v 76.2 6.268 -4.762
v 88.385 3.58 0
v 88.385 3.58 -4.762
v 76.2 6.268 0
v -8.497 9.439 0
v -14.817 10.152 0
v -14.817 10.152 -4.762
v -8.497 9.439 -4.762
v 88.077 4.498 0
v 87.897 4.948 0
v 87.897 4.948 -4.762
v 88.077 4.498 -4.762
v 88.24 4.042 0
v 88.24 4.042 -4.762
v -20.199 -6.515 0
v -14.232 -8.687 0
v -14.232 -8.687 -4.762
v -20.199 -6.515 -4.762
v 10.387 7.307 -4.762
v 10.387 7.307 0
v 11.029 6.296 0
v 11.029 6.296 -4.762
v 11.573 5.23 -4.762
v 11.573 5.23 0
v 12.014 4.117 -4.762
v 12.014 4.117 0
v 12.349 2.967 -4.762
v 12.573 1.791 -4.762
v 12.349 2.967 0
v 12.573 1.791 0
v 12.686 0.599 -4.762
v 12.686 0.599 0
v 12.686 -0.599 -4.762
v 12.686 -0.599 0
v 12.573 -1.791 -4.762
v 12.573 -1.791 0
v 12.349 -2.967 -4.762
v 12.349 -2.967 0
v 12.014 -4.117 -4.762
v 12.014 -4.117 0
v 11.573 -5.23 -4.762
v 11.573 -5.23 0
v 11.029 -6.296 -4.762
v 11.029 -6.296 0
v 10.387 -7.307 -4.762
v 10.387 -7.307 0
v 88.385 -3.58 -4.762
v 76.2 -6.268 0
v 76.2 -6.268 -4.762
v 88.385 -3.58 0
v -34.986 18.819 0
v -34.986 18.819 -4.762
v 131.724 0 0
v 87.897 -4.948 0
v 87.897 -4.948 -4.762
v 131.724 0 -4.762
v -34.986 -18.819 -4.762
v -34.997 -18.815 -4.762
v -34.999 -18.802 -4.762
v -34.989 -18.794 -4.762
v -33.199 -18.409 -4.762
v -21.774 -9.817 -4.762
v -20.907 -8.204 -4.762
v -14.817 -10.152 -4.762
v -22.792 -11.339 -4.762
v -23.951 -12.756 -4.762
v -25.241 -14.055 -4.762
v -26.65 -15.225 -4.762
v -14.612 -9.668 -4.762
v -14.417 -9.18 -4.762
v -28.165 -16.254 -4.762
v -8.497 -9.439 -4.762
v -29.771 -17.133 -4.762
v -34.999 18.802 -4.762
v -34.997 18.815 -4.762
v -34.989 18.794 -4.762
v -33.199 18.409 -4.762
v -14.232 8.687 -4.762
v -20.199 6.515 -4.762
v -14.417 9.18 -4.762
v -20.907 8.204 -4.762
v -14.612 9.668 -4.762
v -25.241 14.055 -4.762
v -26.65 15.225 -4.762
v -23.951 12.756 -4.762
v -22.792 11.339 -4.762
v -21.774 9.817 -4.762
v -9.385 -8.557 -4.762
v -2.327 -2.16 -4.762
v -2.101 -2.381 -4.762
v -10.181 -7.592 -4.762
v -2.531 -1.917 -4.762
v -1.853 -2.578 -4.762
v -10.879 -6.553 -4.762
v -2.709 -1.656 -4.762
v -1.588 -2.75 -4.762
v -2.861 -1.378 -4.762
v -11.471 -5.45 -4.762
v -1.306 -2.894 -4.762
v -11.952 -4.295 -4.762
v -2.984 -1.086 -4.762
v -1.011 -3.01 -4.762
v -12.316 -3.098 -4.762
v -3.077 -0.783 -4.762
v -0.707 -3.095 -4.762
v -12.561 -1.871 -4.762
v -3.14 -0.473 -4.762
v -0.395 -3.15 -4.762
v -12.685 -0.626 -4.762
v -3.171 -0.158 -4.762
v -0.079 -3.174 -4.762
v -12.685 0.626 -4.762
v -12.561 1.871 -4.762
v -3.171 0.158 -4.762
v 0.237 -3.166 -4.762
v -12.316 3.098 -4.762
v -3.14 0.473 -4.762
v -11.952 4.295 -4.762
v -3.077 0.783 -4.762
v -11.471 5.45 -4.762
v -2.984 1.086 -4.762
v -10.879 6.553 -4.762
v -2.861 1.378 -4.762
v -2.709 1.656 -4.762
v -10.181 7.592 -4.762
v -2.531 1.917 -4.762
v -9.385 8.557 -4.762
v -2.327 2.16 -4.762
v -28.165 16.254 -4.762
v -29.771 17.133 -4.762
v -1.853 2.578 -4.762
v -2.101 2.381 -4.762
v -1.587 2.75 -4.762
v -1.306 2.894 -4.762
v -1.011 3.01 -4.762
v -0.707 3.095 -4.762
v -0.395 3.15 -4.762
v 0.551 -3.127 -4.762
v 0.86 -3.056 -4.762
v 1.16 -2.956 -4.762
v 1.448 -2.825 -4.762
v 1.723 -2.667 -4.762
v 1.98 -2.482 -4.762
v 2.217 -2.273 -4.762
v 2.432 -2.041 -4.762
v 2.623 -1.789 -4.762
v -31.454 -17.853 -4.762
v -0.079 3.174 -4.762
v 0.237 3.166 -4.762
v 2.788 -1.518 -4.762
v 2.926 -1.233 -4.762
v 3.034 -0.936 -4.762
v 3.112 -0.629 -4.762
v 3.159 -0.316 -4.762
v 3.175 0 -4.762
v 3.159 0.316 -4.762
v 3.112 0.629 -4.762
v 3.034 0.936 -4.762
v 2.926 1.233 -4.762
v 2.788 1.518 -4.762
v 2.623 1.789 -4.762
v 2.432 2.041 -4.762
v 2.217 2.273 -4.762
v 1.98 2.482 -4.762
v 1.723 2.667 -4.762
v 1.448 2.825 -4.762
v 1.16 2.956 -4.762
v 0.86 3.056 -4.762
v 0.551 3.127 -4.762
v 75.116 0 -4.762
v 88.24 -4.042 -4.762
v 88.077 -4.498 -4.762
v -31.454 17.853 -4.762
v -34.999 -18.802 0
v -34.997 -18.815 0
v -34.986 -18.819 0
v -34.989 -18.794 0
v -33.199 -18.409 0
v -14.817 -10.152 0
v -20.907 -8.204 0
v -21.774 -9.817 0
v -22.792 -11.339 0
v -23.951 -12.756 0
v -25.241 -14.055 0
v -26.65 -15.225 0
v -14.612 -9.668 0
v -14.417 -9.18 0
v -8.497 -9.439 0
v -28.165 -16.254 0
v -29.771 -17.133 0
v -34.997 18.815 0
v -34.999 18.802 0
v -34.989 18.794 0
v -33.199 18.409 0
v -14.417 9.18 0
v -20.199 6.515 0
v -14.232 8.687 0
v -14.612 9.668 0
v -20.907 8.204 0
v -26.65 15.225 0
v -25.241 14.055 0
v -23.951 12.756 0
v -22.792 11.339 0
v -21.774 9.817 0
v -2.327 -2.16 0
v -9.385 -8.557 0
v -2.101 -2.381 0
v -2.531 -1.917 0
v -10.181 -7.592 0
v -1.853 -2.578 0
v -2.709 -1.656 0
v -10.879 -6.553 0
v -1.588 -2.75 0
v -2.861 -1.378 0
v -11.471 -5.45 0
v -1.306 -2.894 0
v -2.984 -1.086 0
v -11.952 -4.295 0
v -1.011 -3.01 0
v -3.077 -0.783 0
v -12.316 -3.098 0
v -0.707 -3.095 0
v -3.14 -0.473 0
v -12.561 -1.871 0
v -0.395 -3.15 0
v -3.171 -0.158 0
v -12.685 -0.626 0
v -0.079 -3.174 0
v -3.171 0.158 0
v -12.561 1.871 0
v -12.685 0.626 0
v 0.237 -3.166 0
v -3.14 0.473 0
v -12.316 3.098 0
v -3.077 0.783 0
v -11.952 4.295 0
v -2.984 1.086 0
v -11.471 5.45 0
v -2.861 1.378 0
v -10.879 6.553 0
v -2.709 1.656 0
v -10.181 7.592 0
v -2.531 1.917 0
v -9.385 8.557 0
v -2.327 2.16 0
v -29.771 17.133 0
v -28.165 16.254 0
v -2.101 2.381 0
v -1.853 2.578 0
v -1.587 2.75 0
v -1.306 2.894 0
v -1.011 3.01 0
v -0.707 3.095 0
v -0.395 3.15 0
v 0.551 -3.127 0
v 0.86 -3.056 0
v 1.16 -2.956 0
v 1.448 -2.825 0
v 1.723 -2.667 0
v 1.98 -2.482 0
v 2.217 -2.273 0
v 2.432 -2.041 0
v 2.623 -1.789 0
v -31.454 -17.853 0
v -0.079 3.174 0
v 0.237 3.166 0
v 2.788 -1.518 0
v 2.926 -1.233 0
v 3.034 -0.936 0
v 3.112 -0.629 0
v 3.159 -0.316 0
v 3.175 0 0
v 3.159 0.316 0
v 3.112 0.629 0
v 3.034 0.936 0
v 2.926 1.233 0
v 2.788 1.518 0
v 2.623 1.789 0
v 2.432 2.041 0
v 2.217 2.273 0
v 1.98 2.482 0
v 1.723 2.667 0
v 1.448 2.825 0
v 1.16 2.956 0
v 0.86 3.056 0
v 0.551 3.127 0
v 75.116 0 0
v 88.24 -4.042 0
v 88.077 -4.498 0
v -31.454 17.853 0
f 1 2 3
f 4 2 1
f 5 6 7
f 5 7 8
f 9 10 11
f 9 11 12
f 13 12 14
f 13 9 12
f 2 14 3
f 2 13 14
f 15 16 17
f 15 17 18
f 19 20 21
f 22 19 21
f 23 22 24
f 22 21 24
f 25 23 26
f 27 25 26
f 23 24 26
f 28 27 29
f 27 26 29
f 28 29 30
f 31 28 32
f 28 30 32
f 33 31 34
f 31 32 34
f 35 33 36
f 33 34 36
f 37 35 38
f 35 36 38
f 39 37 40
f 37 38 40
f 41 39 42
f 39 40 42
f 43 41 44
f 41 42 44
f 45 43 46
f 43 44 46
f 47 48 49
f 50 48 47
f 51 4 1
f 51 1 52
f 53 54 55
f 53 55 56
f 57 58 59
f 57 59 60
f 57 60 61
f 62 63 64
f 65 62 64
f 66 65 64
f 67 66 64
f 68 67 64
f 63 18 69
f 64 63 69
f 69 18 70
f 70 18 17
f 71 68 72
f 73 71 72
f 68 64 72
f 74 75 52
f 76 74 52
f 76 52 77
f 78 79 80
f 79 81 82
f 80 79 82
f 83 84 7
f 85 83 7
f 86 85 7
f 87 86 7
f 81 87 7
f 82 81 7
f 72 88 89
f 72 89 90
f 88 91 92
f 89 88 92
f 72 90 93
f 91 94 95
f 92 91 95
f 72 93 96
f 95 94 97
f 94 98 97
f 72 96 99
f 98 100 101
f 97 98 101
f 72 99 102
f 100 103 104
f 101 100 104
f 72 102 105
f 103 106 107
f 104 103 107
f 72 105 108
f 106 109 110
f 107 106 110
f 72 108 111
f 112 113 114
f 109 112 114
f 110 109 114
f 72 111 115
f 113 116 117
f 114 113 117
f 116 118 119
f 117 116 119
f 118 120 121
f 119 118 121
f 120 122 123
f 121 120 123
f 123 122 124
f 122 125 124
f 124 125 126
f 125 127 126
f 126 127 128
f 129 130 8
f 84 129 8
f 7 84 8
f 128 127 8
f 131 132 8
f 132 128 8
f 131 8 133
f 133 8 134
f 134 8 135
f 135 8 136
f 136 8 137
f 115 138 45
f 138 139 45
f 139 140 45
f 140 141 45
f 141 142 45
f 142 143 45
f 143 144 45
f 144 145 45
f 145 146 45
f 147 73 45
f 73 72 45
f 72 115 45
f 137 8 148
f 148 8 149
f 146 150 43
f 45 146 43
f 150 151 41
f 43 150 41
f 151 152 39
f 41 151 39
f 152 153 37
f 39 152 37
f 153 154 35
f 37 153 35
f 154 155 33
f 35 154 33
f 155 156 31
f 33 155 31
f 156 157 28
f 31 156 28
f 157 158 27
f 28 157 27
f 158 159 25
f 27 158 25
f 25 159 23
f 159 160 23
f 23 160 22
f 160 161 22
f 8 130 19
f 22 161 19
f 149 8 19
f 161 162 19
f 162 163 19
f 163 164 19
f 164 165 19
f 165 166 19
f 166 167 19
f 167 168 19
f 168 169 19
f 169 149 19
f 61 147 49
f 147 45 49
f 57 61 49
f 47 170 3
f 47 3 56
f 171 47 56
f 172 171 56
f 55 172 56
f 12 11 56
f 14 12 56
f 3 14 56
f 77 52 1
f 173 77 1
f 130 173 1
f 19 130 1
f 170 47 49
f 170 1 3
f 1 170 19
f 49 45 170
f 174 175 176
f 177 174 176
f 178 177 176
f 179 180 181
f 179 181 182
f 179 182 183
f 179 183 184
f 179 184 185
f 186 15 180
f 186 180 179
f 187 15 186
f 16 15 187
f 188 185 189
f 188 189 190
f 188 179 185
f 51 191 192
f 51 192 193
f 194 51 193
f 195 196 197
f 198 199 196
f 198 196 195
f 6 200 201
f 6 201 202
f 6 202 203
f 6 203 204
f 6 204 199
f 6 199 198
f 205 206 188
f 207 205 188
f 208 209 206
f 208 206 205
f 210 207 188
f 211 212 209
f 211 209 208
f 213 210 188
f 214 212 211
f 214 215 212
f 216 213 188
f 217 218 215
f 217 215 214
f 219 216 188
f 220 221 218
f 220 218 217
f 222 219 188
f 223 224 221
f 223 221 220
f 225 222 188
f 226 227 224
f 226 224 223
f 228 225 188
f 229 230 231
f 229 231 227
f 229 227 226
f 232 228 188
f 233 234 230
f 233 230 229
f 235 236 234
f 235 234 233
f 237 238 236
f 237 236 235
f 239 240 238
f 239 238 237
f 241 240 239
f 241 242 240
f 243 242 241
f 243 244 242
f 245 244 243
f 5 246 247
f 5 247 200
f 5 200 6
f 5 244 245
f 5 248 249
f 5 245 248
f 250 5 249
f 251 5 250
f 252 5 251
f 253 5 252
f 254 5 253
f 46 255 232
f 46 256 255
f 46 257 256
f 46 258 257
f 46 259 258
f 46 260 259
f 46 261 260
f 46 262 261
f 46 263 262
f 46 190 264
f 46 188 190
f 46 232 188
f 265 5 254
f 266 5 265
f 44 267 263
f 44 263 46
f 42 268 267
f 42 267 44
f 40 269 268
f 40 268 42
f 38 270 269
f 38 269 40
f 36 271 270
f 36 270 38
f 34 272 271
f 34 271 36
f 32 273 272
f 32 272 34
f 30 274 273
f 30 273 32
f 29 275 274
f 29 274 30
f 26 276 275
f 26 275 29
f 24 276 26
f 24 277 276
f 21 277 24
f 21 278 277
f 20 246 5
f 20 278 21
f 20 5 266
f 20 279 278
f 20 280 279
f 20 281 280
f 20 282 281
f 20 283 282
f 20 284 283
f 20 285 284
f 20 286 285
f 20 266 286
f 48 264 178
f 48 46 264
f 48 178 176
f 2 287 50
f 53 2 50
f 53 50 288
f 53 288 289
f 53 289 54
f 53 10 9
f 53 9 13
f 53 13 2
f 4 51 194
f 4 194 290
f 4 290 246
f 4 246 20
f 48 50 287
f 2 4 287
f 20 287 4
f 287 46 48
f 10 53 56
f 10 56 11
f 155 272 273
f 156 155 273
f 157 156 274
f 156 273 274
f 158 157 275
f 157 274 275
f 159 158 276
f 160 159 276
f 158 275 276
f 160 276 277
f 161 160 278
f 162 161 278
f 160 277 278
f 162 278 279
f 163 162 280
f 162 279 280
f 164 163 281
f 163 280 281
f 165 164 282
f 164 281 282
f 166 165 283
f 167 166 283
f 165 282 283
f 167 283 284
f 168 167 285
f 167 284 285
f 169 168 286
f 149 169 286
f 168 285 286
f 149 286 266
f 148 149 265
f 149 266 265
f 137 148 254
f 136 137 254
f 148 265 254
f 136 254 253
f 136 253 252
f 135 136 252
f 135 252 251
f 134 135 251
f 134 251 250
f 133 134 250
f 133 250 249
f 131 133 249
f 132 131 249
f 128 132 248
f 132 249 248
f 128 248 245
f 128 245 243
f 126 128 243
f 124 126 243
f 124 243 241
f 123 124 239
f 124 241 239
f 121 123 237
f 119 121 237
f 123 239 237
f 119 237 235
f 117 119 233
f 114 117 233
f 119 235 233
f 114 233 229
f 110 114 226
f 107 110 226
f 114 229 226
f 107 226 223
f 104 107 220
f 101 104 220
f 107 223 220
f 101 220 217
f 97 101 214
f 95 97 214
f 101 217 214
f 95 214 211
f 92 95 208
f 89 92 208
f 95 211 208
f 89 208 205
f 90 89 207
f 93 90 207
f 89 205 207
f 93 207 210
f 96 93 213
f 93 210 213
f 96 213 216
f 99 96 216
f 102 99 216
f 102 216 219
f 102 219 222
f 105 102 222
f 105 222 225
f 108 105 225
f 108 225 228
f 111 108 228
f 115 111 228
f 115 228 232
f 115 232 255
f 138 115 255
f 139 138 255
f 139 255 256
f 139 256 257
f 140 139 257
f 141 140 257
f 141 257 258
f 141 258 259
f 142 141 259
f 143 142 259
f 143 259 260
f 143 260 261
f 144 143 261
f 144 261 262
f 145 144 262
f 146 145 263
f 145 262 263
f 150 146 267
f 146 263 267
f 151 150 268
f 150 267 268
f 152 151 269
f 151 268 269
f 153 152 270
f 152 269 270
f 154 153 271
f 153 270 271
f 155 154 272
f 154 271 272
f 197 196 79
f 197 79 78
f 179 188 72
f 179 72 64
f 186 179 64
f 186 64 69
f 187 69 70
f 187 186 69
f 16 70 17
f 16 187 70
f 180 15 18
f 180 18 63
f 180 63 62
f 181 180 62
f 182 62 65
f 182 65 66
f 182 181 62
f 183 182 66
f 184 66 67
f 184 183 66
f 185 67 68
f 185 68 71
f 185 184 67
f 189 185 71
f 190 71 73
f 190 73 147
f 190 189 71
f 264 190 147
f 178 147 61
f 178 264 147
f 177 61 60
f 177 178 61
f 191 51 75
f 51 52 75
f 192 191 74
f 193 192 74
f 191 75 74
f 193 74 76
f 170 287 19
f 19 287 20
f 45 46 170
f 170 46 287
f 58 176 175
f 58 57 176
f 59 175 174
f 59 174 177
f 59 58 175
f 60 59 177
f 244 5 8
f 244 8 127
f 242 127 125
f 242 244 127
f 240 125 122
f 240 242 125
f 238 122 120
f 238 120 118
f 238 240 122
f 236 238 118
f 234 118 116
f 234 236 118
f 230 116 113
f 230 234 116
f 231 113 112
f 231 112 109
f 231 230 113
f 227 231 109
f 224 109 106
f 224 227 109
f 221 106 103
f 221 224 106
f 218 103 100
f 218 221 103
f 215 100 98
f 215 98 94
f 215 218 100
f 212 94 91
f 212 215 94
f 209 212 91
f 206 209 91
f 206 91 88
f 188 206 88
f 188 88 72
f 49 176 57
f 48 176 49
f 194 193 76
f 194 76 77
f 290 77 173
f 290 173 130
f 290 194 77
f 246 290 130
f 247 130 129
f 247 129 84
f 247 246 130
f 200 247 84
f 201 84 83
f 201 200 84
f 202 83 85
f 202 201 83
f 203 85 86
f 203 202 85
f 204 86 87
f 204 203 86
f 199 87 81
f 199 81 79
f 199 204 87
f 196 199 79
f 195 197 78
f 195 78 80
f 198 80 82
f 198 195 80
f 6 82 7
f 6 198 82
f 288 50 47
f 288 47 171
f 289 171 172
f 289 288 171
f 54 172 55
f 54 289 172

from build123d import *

# Parameters (mm, degrees)
SKETCH1_R           = 3.175
BOSS_EXTRUDE2_DEPTH = 4.7625
FILLET1_R           = 0.0127


with BuildPart() as part:
    # Sketch1 → Boss-Extrude2 (new body)
    with BuildSketch(Plane.XY):
        with BuildLine():
            Line((131.7244, 0), (87.896637, 4.947593))
            ThreePointArc((87.896637, 4.947593), (88.160392, 4.270718), (88.385012, 3.579871))
            Line((88.385012, 3.579871), (76.2, 6.267993))
            Line((76.2, 6.267993), (-35.963072, 18.929766))
            ThreePointArc((-35.963072, 18.929766), (-26.314005, 14.966389), (-20.198856, 6.515484))
            Line((-20.198856, 6.515484), (-14.231807, 8.687312))
            ThreePointArc((-14.231807, 8.687312), (-14.513112, 9.424368), (-14.81717, 10.152332))
            Line((-14.81717, 10.152332), (-8.496937, 9.438859))
            ThreePointArc((-8.496937, 9.438859), (-12.7, 0), (-8.496937, -9.438859))
            Line((-8.496937, -9.438859), (-14.81717, -10.152332))
            ThreePointArc((-14.81717, -10.152332), (-14.513112, -9.424368), (-14.231807, -8.687312))
            Line((-14.231807, -8.687312), (-20.198856, -6.515484))
            ThreePointArc((-20.198856, -6.515484), (-26.314005, -14.966389), (-35.963072, -18.929766))
            Line((-35.963072, -18.929766), (76.2, -6.267993))
            Line((76.2, -6.267993), (88.385012, -3.579871))
            ThreePointArc((88.385012, -3.579871), (88.160392, -4.270718), (87.896637, -4.947593))
            Line((87.896637, -4.947593), (131.7244, 0))
        make_face()
        Circle(SKETCH1_R, mode=Mode.SUBTRACT)
        with BuildLine():
            Line((75.116267, 0), (10.387338, 7.307066))
            ThreePointArc((10.387338, 7.307066), (12.7, 0), (10.387338, -7.307066))
            Line((10.387338, -7.307066), (75.116267, 0))
        make_face(mode=Mode.SUBTRACT)
    extrude(amount=-BOSS_EXTRUDE2_DEPTH)

    # Fillet1
    fillet1_edges = [part.edges().sort_by_distance(p)[0] for p in [
        (-35.963072, 18.929766, -2.38125),
        (-35.963072, -18.929766, -2.38125),
    ]]
    fillet(fillet1_edges, radius=FILLET1_R)


solid = part.part
